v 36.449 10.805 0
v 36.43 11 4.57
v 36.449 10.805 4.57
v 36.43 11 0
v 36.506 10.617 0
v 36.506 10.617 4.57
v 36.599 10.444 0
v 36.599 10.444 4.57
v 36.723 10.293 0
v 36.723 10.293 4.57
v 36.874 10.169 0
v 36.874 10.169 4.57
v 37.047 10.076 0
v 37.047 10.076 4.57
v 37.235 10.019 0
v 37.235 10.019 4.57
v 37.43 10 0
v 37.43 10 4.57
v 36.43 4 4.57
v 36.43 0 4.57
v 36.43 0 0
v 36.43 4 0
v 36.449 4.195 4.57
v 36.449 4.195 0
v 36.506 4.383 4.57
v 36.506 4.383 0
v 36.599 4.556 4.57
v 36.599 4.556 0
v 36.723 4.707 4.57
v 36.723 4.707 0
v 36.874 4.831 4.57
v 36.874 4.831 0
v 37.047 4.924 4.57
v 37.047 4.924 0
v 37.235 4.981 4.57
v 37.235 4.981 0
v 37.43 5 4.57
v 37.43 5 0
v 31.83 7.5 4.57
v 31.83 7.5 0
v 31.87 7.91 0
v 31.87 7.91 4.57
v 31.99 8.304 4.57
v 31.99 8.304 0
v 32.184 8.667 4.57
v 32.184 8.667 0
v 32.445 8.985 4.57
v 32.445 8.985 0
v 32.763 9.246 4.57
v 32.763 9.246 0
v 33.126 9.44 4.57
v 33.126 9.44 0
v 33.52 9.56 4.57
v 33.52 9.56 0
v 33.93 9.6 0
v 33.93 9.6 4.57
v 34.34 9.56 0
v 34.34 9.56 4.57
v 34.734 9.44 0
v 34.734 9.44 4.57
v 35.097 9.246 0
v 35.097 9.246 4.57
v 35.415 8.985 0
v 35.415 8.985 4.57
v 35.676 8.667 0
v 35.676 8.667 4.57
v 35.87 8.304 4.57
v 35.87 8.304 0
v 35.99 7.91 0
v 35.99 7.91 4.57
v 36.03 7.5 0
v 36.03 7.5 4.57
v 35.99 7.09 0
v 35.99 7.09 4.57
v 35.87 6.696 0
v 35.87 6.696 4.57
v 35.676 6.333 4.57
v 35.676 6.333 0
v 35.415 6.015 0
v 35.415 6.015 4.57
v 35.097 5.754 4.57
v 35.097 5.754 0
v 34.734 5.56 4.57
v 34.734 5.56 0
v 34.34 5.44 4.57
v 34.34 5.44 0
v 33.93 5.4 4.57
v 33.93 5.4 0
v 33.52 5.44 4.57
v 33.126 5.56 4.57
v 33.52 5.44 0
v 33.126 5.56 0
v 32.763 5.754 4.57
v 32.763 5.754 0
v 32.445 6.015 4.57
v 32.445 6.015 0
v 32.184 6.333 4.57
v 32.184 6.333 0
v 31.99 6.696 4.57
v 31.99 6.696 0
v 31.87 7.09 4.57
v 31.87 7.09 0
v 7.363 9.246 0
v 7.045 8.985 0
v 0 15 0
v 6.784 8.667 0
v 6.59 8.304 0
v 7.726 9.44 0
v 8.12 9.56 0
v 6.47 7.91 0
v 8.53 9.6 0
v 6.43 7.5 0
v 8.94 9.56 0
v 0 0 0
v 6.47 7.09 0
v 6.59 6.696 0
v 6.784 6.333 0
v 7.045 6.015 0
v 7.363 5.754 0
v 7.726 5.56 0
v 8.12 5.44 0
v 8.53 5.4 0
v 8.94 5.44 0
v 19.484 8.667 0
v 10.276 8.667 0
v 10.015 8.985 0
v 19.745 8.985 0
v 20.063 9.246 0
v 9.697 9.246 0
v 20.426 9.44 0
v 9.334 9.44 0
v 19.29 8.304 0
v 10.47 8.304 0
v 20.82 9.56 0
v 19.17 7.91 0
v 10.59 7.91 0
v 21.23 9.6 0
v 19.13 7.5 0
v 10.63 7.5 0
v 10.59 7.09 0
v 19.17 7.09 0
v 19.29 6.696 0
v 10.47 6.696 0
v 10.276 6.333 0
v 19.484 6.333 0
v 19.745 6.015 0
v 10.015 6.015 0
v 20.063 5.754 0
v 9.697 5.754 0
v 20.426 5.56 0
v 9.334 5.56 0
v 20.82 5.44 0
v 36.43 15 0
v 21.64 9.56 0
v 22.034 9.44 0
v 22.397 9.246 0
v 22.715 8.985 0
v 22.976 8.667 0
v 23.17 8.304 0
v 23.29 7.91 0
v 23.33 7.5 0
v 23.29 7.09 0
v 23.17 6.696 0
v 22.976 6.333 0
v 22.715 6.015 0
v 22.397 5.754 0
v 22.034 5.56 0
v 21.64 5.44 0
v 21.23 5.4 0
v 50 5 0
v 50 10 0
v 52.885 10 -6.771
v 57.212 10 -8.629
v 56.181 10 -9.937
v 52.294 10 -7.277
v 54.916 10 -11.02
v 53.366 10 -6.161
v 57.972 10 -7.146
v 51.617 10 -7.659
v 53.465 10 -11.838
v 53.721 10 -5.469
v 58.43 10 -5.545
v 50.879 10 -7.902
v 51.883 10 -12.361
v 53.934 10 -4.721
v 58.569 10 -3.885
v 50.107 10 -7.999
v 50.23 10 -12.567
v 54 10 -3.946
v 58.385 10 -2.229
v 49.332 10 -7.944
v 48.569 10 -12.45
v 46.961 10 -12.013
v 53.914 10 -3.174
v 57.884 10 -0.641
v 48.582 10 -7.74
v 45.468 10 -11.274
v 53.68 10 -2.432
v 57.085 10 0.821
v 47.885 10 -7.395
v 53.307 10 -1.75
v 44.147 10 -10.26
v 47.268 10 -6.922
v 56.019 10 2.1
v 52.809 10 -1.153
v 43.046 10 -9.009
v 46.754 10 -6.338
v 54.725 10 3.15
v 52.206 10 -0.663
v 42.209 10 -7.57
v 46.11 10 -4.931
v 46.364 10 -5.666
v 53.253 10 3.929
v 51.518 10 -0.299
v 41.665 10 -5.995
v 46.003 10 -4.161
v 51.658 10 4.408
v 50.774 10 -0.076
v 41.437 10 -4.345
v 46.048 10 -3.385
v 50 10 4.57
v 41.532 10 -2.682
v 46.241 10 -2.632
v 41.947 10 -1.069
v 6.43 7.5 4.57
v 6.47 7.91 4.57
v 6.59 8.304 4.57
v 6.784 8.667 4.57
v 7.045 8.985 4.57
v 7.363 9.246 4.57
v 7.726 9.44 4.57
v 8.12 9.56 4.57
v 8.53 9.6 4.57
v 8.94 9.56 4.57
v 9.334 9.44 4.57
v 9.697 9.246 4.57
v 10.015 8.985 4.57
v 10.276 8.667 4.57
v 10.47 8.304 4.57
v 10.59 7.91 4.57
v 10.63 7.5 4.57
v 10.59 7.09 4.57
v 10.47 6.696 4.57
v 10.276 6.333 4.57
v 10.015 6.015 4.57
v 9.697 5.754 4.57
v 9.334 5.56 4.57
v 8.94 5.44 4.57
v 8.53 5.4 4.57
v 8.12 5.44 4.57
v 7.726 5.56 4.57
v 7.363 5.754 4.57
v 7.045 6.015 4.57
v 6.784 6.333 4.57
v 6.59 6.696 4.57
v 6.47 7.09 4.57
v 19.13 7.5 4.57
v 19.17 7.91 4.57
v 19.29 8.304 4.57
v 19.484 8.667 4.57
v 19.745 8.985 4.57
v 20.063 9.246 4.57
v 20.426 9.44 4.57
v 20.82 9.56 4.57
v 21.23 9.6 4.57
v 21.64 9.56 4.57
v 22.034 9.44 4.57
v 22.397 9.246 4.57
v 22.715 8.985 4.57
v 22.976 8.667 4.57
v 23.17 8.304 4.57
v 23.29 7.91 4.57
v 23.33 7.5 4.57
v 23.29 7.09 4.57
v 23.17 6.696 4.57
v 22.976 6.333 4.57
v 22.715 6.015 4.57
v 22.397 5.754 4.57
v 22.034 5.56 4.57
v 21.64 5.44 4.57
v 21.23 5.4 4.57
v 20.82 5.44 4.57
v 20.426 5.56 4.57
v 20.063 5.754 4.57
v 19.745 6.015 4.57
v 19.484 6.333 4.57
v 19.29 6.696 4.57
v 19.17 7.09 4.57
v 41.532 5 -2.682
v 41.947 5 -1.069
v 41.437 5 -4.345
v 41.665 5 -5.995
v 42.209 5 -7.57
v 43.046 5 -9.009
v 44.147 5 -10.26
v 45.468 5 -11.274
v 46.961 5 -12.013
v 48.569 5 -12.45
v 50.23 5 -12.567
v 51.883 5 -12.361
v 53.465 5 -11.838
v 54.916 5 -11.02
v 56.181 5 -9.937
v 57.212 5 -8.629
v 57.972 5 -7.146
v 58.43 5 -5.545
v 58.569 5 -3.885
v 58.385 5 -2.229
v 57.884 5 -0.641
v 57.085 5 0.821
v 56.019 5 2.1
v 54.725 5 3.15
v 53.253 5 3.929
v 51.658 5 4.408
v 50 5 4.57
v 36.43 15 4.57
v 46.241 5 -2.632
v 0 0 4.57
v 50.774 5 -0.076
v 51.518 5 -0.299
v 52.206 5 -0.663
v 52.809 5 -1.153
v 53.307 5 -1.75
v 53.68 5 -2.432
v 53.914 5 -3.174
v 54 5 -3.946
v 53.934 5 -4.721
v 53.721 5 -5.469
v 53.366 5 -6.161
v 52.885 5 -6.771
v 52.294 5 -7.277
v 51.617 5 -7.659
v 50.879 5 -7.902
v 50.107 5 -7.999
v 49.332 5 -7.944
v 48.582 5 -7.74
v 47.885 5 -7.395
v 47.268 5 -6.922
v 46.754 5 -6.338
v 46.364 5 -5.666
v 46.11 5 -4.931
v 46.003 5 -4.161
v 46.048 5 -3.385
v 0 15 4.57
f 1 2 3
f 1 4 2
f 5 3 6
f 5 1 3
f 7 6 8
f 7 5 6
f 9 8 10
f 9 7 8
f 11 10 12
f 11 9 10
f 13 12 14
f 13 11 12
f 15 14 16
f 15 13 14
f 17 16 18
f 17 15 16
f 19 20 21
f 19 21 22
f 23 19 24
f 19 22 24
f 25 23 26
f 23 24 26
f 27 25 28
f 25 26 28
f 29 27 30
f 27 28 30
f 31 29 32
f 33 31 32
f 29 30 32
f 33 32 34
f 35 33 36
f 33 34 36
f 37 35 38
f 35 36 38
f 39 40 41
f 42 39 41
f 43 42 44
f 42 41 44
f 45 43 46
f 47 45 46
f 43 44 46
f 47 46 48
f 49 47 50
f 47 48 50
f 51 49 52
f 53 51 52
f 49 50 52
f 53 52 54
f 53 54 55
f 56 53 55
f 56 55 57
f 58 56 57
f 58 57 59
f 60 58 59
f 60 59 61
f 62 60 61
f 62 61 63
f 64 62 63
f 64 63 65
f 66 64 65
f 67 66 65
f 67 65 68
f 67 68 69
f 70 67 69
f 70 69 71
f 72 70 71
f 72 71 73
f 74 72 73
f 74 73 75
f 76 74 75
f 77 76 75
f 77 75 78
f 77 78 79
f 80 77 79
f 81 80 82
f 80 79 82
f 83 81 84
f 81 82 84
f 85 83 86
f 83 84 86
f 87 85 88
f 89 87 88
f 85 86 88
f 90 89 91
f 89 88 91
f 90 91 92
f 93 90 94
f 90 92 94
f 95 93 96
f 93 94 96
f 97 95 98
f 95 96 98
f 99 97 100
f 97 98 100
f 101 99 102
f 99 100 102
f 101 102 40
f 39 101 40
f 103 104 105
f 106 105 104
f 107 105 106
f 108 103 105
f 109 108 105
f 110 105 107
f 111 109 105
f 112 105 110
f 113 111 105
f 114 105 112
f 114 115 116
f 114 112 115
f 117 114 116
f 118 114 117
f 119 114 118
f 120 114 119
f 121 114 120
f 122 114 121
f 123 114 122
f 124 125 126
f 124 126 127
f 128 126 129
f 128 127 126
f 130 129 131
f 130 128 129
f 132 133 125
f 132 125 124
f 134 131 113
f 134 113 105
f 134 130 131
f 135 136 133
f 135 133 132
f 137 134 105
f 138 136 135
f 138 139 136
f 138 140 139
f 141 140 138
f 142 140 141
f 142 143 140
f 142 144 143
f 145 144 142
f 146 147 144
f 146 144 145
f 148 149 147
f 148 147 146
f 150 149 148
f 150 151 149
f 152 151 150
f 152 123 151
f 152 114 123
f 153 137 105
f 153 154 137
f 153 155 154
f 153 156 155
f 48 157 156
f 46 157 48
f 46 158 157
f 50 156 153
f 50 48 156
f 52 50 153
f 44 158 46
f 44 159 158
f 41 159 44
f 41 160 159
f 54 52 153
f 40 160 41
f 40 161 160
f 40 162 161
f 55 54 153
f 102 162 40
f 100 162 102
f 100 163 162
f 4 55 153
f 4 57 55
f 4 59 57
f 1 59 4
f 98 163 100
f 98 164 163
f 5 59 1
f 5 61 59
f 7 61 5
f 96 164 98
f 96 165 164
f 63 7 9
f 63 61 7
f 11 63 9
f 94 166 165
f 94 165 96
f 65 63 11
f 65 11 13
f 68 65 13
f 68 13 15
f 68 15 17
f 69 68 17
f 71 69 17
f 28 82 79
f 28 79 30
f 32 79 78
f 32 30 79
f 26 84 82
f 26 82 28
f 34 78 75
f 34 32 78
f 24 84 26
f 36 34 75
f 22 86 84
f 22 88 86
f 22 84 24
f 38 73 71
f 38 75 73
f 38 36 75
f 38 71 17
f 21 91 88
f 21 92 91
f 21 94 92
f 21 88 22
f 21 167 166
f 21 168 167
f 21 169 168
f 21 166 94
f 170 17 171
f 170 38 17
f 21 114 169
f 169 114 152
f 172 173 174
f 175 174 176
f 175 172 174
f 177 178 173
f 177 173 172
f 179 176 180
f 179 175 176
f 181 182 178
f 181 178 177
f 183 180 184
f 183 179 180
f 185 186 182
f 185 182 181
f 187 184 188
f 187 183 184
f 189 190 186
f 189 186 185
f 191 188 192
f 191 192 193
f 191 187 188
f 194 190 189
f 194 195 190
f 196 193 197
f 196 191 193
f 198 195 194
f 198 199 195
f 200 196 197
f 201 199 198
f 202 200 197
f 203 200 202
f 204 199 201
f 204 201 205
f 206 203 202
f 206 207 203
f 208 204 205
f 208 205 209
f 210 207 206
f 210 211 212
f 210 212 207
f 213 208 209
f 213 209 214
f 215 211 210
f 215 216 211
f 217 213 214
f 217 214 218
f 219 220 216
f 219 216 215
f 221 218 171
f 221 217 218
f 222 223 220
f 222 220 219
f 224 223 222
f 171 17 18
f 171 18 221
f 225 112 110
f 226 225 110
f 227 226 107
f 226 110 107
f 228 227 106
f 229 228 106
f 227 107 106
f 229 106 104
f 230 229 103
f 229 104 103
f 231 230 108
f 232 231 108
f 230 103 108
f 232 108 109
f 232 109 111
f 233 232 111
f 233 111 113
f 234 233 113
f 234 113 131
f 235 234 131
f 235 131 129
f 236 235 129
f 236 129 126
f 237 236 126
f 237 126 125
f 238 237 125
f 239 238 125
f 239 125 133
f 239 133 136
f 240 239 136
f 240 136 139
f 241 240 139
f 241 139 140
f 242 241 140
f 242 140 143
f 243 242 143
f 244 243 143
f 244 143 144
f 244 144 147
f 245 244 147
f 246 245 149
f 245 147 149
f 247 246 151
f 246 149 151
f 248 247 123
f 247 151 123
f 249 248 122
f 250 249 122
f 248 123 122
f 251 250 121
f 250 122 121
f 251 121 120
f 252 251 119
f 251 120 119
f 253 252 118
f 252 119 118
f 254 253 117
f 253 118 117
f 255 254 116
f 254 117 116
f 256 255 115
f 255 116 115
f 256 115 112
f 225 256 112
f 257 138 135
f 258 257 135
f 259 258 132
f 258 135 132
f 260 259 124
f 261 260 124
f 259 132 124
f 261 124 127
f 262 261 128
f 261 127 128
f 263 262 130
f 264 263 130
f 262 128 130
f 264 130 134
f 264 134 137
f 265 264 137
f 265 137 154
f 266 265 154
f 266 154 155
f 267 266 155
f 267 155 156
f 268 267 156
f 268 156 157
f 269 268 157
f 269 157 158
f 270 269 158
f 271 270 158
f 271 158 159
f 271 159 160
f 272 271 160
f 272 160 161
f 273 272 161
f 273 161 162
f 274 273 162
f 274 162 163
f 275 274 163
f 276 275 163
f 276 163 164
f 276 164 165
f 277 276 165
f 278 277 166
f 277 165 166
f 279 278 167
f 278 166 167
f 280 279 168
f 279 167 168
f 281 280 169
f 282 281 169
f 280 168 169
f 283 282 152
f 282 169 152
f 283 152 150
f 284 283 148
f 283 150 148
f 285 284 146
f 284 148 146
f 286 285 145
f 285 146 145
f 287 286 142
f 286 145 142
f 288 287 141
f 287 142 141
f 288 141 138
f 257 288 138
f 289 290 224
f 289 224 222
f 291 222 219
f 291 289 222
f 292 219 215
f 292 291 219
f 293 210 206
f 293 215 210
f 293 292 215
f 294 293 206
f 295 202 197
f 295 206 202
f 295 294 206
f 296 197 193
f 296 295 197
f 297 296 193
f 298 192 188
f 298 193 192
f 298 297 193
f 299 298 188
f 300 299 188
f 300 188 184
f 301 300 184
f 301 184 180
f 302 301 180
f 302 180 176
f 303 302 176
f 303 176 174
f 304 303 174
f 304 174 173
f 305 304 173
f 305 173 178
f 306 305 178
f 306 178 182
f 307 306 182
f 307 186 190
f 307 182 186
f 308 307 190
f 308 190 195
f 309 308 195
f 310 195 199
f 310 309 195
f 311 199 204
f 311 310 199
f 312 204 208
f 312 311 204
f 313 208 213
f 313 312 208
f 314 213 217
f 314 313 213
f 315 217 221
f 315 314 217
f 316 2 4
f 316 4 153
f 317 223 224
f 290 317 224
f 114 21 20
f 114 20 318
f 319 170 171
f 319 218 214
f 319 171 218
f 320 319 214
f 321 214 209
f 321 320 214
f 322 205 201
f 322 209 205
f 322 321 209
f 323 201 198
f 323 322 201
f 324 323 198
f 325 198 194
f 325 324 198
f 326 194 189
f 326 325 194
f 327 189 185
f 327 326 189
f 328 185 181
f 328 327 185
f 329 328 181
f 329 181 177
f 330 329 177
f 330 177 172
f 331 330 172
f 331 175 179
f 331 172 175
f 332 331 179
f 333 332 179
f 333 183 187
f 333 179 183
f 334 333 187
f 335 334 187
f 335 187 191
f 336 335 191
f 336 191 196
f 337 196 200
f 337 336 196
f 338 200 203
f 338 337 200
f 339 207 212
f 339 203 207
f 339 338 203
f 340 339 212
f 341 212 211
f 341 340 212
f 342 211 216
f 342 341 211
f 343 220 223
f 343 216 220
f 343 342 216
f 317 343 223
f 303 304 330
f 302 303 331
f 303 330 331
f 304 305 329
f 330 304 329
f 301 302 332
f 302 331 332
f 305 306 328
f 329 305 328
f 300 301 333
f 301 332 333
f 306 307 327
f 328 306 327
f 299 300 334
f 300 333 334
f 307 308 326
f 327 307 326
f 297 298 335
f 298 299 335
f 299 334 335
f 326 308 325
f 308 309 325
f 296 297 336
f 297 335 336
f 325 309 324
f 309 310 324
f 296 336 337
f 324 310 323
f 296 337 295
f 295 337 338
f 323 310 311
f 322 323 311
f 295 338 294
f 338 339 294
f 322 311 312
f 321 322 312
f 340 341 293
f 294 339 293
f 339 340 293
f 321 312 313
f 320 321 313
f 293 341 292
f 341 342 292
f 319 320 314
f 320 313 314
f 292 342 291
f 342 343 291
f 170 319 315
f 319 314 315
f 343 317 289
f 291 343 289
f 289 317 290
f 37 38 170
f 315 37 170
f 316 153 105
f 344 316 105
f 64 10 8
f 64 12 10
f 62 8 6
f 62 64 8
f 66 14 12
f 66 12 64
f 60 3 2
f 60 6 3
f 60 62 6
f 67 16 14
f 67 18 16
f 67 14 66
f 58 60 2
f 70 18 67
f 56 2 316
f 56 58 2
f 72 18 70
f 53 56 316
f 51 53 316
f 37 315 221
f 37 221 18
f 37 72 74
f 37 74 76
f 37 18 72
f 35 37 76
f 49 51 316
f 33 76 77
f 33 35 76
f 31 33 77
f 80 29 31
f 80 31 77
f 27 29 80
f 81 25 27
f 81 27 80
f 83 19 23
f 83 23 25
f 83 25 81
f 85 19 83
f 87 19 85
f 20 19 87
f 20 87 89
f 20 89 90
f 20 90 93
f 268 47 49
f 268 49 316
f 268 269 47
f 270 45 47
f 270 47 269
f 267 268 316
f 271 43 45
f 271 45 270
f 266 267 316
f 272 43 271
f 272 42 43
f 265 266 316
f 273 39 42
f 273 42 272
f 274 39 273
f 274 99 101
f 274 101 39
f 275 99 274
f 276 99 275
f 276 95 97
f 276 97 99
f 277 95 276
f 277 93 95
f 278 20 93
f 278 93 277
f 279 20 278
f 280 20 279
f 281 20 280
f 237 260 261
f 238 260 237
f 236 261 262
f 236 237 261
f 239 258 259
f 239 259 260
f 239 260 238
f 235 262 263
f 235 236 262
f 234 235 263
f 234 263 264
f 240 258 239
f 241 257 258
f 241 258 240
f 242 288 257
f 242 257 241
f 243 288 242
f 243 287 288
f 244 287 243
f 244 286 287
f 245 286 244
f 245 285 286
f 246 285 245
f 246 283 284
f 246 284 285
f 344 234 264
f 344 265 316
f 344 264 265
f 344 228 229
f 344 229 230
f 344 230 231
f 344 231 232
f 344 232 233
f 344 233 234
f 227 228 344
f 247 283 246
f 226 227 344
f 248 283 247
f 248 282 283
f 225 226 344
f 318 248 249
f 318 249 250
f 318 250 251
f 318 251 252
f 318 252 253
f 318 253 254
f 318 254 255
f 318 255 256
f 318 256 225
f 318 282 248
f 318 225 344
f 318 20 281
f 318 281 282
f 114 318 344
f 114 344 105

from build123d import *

# Parameters (mm, degrees)
BASE_FLANGE1_DEPTH      = 15
CUT_EXTRUDE1_DEPTH      = 14
CUT_EXTRUDE1_DEPTH_BACK = 10
SKETCH6_W               = 22.14
SKETCH6_H               = 5
SKETCH7_R               = 2.1
CUT_EXTRUDE2_DEPTH      = 10
FILLET2_R               = 1


# Sheet-metal steps are written as plain solids
with BuildPart() as part:
    # Sketch1 → Base-Flange1 (new body)
    with BuildSketch(Plane(origin=(0, 0, 0), x_dir=(1, 0, 0), z_dir=(0, 1, 0))):
        with BuildLine():
            Line((0, 0), (50, 0))
            ThreePointArc((50, 0), (52.294305745, 7.276608177), (46.241229517, 2.631919427))
            Line((46.241229517, 2.631919427), (41.94683424, 1.068887372))
            ThreePointArc((41.94683424, 1.068887372), (54.91555006, 11.02013302), (50, -4.57))
            Line((50, -4.57), (0, -4.57))
            Line((0, -4.57), (0, 0))
        make_face()
    extrude(amount=BASE_FLANGE1_DEPTH)

    # Sketch6 → Cut-Extrude1 (cut, two sides: drawn at the far end of the back side and taken through both)
    with BuildSketch(Plane(origin=(0, 0, 0), x_dir=(-1, 0, 0), z_dir=(0, 0, -1)).offset(-CUT_EXTRUDE1_DEPTH_BACK)):
        with Locations((-47.5, 12.5)):
            Rectangle(SKETCH6_W, SKETCH6_H)
        with Locations((-47.5, 2.5)):
            Rectangle(SKETCH6_W, SKETCH6_H)
    extrude(amount=CUT_EXTRUDE1_DEPTH + CUT_EXTRUDE1_DEPTH_BACK, mode=Mode.SUBTRACT)

    # Sketch7 → Cut-Extrude2 (cut)
    with BuildSketch(Plane(origin=(0, 0, 0), x_dir=(-1, 0, 0), z_dir=(0, 0, -1))):
        with Locations((-21.23, 7.5)):
            Circle(SKETCH7_R)
        with Locations((-33.93, 7.5)):
            Circle(SKETCH7_R)
        with Locations((-8.53, 7.5)):
            Circle(SKETCH7_R)
    extrude(amount=-CUT_EXTRUDE2_DEPTH, mode=Mode.SUBTRACT)

    # Fillet2
    fillet2_edges = [part.edges().sort_by_distance(p)[0] for p in [
        (36.43, 10, 2.285),
        (36.43, 5, 2.285),
    ]]
    fillet(fillet2_edges, radius=FILLET2_R)


solid = part.part
